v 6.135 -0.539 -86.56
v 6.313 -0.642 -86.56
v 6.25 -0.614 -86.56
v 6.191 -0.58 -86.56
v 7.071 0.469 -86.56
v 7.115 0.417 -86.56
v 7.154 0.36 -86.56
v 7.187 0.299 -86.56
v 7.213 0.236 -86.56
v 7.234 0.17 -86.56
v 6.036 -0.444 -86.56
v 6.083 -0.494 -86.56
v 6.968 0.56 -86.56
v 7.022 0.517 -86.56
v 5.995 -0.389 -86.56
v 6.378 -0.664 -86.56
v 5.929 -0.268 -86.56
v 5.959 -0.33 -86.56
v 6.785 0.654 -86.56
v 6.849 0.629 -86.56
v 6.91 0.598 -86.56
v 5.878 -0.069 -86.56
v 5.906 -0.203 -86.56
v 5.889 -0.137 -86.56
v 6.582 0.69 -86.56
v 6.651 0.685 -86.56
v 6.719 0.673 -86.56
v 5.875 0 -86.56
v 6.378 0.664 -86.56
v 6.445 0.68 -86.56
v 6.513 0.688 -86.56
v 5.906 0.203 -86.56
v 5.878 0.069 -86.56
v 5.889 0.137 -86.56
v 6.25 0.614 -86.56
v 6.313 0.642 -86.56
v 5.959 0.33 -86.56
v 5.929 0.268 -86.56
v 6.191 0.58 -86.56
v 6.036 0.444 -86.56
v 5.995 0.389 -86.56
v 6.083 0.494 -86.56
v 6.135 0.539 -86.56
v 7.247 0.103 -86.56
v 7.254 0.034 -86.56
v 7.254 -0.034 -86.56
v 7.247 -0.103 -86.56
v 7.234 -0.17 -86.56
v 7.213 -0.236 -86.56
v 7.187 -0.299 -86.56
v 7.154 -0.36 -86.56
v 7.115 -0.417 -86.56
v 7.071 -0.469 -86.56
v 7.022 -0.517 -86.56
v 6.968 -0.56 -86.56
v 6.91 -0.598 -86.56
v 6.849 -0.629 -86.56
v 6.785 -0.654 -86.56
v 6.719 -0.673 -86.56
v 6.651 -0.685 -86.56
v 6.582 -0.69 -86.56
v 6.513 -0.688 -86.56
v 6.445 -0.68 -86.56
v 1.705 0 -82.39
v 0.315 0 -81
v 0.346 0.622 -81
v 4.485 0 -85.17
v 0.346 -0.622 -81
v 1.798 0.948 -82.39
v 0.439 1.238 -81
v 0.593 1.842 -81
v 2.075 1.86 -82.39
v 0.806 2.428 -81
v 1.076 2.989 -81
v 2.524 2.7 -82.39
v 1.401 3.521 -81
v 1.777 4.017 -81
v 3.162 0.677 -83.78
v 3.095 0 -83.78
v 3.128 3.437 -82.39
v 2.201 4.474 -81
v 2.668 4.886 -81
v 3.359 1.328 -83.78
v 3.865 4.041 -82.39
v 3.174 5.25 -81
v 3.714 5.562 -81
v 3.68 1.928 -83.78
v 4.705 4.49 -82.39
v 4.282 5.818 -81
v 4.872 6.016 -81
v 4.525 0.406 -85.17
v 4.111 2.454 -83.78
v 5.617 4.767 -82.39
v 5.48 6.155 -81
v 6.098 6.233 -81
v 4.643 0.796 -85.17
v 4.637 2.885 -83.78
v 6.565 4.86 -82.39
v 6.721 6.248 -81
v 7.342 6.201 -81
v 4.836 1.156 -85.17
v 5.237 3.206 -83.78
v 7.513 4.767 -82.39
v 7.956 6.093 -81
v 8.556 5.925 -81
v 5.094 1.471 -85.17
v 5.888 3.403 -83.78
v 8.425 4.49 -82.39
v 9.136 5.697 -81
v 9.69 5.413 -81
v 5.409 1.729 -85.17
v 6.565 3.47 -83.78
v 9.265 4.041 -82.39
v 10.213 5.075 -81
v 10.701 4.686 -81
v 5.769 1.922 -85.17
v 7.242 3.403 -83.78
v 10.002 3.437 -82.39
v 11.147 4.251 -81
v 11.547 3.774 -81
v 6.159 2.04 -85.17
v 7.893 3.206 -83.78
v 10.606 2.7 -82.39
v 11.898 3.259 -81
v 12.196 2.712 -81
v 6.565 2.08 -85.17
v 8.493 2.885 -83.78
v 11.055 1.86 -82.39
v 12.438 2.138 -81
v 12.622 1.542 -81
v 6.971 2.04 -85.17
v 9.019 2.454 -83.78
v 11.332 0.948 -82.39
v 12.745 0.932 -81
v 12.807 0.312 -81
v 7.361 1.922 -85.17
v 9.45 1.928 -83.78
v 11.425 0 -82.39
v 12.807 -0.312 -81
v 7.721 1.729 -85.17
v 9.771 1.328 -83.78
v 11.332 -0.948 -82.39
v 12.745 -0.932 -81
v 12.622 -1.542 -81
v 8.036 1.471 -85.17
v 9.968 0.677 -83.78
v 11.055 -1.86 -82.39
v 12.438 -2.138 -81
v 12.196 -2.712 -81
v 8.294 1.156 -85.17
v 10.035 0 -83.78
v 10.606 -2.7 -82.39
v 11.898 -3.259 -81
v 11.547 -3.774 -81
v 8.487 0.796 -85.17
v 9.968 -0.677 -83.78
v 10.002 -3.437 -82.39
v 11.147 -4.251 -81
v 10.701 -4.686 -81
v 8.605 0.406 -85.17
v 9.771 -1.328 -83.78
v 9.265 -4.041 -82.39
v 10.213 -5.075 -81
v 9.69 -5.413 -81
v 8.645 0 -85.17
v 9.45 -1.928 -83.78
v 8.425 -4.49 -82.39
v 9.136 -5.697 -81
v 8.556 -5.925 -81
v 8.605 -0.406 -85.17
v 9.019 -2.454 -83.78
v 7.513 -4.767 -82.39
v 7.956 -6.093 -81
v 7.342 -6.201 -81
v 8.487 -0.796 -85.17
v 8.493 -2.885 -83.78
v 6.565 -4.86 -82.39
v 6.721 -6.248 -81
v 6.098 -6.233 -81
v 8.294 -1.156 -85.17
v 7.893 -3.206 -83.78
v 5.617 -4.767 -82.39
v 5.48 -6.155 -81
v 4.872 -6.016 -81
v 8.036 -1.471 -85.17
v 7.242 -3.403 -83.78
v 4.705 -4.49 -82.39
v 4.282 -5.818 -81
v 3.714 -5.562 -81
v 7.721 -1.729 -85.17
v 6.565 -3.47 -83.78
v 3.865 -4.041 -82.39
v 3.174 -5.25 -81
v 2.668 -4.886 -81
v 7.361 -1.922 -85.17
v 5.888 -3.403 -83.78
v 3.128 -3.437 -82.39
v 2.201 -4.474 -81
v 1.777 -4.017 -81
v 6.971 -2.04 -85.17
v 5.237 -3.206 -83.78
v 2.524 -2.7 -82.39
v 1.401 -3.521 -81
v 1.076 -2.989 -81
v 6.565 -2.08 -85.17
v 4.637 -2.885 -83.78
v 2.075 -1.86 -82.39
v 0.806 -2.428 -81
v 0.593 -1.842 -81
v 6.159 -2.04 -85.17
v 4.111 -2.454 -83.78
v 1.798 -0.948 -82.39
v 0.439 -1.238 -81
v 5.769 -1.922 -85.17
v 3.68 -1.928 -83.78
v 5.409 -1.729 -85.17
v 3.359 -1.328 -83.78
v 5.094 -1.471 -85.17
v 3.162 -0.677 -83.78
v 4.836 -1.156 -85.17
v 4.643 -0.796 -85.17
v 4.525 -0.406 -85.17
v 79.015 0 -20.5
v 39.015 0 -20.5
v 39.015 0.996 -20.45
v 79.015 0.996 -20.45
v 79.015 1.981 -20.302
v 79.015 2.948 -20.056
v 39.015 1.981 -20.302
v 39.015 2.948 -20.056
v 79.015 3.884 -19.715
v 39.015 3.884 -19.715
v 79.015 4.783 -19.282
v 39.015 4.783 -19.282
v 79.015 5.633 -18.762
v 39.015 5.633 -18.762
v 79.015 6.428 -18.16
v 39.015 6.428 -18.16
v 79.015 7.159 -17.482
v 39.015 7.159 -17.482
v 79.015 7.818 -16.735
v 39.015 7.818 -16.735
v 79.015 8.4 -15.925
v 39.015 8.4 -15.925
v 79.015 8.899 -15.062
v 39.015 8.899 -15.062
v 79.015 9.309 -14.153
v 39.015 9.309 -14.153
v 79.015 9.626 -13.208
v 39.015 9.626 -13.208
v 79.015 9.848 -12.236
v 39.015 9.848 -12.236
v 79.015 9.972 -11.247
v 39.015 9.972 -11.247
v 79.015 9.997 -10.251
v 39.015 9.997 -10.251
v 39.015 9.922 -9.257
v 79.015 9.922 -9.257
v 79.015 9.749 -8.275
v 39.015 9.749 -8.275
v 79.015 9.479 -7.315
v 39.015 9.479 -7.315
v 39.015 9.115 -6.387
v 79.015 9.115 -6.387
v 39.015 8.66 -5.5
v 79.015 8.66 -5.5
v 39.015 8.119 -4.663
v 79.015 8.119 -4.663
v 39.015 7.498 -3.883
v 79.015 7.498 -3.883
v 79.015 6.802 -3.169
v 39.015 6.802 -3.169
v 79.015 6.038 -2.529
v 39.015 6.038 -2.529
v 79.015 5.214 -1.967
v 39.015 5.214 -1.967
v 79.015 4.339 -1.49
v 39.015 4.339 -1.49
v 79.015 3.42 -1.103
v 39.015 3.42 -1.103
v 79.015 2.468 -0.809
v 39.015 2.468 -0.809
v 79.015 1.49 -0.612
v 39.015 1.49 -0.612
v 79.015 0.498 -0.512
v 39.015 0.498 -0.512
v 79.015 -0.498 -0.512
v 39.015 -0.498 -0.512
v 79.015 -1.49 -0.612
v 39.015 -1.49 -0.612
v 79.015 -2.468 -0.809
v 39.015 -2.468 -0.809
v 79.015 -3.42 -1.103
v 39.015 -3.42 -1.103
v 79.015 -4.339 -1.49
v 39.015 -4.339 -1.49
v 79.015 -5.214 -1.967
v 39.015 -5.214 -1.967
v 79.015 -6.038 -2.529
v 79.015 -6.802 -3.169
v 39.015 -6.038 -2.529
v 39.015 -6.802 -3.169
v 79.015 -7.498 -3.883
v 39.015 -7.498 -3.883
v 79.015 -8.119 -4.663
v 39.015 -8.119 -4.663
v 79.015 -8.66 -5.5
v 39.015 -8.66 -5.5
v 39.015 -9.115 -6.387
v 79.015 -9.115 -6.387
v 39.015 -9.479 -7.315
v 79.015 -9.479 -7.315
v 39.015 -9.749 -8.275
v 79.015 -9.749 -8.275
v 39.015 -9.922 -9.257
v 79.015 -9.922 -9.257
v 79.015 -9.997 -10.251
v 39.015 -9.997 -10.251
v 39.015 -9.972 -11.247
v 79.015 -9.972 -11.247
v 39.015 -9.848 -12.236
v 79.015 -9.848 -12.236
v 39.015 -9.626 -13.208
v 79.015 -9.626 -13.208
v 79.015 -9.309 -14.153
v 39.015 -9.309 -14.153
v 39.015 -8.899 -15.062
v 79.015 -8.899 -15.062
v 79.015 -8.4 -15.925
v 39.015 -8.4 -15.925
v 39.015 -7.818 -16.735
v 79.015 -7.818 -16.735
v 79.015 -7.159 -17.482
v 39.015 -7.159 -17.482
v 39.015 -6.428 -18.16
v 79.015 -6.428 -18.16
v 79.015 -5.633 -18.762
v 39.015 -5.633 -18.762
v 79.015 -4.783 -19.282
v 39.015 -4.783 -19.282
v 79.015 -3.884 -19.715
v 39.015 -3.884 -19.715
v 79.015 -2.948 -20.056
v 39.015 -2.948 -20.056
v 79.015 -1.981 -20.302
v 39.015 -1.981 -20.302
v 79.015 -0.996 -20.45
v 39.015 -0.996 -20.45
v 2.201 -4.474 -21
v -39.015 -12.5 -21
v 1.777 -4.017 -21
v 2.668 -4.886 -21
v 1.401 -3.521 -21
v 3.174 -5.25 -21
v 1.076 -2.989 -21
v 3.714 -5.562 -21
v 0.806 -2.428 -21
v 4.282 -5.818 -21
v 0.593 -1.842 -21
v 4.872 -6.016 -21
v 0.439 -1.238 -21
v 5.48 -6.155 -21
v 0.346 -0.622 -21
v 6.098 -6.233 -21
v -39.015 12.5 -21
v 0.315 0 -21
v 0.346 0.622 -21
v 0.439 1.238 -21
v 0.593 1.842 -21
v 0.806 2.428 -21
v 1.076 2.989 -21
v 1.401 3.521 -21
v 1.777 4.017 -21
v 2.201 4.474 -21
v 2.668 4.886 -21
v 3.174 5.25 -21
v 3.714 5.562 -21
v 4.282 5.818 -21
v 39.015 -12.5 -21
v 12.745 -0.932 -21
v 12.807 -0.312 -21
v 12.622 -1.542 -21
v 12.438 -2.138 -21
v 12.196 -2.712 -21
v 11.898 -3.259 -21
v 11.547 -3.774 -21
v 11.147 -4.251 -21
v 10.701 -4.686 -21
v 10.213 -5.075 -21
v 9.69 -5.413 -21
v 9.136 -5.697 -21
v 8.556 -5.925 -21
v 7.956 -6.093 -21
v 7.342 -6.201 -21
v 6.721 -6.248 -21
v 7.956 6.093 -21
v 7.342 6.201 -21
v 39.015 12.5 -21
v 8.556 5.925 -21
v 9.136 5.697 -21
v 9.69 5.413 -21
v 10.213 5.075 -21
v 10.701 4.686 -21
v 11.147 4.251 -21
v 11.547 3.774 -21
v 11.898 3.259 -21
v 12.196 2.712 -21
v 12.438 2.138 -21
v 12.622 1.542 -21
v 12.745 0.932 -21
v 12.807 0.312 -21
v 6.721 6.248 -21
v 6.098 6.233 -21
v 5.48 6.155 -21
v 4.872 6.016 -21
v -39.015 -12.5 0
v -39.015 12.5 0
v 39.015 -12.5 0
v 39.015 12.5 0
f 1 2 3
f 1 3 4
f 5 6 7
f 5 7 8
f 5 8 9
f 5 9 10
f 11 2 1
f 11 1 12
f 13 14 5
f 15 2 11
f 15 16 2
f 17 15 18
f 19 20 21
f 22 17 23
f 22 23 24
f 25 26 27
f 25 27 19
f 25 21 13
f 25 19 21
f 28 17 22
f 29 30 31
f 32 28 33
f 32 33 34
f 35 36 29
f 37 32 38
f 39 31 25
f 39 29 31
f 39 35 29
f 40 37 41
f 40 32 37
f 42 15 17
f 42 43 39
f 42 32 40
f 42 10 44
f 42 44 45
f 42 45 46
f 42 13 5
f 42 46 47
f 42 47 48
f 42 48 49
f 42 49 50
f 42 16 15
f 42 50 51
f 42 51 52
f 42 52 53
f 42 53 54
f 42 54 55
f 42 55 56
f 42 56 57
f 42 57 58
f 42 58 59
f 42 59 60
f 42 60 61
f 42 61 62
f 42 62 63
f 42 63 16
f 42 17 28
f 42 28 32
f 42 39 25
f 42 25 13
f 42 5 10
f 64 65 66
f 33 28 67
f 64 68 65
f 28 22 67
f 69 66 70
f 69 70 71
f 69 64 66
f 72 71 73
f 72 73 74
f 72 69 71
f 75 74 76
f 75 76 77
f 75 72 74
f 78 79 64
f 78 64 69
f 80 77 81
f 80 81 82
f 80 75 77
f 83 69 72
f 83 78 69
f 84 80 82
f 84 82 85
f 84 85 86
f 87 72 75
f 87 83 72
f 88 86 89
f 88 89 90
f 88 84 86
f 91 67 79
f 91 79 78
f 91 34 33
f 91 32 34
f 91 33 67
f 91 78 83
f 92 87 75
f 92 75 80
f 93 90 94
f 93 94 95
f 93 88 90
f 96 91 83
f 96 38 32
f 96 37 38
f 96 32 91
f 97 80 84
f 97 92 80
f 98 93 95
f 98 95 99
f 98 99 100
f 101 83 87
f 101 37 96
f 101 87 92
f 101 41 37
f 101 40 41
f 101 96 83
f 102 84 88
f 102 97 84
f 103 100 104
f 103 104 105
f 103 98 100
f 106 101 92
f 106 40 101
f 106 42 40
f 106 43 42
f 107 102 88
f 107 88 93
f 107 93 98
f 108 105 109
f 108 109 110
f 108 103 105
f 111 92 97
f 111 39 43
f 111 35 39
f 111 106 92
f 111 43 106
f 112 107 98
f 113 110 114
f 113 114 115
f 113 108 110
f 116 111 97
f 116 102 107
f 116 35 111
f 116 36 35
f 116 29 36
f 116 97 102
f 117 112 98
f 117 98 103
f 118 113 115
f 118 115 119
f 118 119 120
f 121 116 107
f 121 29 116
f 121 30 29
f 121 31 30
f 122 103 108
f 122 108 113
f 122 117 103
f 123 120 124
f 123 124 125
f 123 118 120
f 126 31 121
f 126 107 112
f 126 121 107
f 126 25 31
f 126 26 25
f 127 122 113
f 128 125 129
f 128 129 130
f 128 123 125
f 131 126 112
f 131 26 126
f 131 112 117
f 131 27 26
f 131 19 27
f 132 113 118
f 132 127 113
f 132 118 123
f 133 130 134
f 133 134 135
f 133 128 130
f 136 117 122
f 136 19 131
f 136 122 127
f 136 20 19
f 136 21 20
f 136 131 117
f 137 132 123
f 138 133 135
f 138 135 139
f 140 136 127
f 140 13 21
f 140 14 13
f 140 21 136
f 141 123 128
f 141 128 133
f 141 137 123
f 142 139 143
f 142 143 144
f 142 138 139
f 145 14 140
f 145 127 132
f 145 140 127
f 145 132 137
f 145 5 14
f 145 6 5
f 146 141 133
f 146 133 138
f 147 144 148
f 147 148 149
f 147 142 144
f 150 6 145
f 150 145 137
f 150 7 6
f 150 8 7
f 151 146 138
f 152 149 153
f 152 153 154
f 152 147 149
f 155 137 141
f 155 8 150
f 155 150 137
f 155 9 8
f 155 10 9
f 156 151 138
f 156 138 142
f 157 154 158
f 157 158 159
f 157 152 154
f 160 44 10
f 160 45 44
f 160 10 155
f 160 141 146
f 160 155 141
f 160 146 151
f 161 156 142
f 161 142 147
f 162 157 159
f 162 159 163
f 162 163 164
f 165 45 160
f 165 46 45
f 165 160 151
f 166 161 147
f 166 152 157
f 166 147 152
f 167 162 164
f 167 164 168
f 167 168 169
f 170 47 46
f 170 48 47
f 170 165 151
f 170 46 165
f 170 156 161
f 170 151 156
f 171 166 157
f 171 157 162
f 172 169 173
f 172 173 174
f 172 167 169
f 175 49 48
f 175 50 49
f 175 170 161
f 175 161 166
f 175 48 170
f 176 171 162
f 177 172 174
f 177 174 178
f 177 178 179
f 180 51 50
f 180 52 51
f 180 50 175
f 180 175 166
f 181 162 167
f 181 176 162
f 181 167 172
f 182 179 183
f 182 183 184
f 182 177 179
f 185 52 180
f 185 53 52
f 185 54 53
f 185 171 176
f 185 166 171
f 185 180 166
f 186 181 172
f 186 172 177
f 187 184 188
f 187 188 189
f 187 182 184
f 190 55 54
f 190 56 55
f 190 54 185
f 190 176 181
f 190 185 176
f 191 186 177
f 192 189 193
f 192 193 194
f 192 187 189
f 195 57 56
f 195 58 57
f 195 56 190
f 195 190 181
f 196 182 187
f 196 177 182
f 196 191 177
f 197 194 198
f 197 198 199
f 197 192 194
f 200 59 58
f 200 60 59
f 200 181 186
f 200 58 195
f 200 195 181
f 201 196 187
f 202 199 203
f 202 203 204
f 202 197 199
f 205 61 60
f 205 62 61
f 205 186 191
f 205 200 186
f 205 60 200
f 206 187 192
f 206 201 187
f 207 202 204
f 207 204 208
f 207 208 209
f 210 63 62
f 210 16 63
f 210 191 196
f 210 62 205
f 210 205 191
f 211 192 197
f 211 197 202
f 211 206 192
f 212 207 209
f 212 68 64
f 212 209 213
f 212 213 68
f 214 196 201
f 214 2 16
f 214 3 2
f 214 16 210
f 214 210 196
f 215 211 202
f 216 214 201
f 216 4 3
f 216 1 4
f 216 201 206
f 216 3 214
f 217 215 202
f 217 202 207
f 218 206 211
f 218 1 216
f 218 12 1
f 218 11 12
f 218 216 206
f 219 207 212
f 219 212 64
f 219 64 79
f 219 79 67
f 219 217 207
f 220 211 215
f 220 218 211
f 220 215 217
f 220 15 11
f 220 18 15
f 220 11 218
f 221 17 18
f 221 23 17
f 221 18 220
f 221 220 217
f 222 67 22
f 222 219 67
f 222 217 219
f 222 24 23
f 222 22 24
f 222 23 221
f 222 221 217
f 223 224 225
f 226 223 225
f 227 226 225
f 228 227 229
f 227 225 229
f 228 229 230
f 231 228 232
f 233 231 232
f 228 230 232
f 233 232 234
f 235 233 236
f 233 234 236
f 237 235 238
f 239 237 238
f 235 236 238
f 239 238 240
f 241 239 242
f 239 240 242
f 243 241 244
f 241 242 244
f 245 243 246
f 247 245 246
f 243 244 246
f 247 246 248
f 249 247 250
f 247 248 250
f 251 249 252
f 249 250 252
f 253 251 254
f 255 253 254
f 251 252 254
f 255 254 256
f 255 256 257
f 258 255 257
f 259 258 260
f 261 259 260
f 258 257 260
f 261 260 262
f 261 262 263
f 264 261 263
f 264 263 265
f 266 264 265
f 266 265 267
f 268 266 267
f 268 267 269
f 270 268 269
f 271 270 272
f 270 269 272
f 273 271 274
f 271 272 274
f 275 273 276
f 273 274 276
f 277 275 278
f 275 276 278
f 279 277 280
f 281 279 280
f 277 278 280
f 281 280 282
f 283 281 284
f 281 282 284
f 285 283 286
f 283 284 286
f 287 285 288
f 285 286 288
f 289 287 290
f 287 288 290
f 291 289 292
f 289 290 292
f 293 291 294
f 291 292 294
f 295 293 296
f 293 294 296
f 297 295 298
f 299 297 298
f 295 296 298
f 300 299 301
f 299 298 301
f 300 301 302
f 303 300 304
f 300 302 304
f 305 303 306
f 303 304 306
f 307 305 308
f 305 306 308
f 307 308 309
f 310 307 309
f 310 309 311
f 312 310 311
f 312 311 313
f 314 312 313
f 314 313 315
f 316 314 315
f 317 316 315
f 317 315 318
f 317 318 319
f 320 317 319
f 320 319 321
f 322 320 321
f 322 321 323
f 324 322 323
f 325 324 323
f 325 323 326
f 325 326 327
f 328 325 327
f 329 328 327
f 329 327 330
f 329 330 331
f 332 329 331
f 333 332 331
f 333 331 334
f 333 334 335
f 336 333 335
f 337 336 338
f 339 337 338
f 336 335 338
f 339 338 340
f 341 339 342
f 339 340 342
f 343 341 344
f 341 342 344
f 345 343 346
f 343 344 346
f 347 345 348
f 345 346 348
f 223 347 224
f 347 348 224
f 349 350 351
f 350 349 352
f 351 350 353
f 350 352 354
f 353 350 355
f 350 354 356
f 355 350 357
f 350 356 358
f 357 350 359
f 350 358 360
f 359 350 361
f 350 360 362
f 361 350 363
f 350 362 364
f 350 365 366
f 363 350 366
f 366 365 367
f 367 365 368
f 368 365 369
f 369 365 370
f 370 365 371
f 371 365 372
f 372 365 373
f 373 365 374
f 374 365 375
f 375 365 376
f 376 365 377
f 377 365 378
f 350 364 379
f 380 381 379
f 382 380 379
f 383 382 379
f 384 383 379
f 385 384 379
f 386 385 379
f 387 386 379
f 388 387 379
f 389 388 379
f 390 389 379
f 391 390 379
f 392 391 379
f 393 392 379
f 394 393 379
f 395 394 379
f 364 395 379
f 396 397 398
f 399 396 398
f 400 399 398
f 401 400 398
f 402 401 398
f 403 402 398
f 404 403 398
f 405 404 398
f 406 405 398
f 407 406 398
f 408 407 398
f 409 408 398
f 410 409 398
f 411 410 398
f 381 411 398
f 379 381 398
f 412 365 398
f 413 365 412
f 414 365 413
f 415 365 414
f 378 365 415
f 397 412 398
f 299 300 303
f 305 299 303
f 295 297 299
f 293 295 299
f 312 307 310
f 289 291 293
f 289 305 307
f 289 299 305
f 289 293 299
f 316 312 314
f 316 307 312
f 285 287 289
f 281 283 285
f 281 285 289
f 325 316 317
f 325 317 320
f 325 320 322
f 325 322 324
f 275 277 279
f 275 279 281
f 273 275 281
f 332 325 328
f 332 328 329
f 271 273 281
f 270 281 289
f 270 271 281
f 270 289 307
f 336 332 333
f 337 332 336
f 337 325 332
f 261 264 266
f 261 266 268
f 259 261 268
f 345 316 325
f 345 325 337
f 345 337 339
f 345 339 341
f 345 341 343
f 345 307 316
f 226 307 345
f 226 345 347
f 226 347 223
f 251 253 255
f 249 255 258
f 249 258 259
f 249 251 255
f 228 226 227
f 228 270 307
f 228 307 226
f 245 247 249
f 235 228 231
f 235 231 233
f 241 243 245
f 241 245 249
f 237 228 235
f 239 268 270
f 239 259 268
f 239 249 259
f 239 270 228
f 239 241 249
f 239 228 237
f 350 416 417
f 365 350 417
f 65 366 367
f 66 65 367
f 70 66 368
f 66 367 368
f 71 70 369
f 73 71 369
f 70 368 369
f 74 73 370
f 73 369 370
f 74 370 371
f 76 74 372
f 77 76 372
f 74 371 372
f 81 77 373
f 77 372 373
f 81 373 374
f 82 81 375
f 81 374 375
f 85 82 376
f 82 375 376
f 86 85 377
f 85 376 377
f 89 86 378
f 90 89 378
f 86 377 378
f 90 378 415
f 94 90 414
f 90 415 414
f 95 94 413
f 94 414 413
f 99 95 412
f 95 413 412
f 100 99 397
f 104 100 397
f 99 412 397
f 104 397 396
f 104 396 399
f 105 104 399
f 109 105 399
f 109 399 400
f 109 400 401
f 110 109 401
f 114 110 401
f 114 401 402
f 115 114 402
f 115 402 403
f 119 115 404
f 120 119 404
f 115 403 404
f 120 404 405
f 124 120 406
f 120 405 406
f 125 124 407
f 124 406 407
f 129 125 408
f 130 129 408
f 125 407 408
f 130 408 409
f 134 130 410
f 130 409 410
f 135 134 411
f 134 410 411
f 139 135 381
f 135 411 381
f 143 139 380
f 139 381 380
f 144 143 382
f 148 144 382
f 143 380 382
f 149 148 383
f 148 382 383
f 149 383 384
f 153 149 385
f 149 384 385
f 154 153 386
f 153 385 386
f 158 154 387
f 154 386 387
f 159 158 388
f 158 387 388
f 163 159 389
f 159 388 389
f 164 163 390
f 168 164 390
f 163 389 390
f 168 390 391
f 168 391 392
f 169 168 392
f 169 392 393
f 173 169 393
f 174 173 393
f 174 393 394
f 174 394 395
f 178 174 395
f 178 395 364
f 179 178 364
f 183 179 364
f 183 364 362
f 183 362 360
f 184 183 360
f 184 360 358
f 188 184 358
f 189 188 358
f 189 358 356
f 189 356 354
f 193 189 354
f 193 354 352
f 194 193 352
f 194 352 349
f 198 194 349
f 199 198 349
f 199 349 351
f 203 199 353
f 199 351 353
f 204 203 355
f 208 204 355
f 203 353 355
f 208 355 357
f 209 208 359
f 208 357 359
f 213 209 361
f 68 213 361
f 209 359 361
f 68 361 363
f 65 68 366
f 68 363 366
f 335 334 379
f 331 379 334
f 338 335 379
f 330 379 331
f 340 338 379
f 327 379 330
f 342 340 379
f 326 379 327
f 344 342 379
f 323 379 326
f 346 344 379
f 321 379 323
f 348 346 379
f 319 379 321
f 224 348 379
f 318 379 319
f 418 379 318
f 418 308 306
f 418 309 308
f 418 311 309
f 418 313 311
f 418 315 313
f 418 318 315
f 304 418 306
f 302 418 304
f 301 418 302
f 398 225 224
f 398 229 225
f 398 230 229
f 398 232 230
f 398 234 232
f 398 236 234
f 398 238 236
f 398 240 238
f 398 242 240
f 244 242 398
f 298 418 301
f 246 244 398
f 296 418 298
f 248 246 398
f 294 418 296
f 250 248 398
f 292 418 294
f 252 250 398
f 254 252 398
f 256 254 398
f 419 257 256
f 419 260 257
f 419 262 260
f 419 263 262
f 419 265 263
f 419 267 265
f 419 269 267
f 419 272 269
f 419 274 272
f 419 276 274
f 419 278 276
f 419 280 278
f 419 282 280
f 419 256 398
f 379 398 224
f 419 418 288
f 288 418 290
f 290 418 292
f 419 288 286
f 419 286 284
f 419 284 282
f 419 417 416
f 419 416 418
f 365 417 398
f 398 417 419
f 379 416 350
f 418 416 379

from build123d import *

# Parameters (mm, degrees)
SKETCH1_W           = 78.03
SKETCH1_H           = 25
BOSS_EXTRUDE1_DEPTH = 21
SKETCH2_R           = 10
BOSS_EXTRUDE2_DEPTH = 40
SKETCH4_R           = 6.25
BOSS_EXTRUDE3_DEPTH = 65.56
CHAMFER1_SIZE       = 5.56


with BuildPart() as part:
    # Sketch1 → Boss-Extrude1 (new body)
    with BuildSketch(Plane.XY):
        Rectangle(SKETCH1_W, SKETCH1_H)
    extrude(amount=-BOSS_EXTRUDE1_DEPTH)

    # Sketch2 → Boss-Extrude2 (add)
    with BuildSketch(Plane(origin=(39.015, 0, 0), x_dir=(0, 0, -1), z_dir=(1, 0, 0))):
        with Locations((10.5, 0)):
            Circle(SKETCH2_R)
    extrude(amount=BOSS_EXTRUDE2_DEPTH)

    # Sketch4 → Boss-Extrude3 (add)
    with BuildSketch(Plane(origin=(0, 0, -21), x_dir=(-1, 0, 0), z_dir=(0, 0, -1))):
        with Locations((-6.565, 0)):
            Circle(SKETCH4_R)
    extrude(amount=BOSS_EXTRUDE3_DEPTH)

    # Chamfer1
    chamfer1_edges = [part.edges().sort_by_distance(p)[0] for p in [
        (12.815, 0, -86.56),
    ]]
    chamfer(chamfer1_edges, length=CHAMFER1_SIZE)


solid = part.part
